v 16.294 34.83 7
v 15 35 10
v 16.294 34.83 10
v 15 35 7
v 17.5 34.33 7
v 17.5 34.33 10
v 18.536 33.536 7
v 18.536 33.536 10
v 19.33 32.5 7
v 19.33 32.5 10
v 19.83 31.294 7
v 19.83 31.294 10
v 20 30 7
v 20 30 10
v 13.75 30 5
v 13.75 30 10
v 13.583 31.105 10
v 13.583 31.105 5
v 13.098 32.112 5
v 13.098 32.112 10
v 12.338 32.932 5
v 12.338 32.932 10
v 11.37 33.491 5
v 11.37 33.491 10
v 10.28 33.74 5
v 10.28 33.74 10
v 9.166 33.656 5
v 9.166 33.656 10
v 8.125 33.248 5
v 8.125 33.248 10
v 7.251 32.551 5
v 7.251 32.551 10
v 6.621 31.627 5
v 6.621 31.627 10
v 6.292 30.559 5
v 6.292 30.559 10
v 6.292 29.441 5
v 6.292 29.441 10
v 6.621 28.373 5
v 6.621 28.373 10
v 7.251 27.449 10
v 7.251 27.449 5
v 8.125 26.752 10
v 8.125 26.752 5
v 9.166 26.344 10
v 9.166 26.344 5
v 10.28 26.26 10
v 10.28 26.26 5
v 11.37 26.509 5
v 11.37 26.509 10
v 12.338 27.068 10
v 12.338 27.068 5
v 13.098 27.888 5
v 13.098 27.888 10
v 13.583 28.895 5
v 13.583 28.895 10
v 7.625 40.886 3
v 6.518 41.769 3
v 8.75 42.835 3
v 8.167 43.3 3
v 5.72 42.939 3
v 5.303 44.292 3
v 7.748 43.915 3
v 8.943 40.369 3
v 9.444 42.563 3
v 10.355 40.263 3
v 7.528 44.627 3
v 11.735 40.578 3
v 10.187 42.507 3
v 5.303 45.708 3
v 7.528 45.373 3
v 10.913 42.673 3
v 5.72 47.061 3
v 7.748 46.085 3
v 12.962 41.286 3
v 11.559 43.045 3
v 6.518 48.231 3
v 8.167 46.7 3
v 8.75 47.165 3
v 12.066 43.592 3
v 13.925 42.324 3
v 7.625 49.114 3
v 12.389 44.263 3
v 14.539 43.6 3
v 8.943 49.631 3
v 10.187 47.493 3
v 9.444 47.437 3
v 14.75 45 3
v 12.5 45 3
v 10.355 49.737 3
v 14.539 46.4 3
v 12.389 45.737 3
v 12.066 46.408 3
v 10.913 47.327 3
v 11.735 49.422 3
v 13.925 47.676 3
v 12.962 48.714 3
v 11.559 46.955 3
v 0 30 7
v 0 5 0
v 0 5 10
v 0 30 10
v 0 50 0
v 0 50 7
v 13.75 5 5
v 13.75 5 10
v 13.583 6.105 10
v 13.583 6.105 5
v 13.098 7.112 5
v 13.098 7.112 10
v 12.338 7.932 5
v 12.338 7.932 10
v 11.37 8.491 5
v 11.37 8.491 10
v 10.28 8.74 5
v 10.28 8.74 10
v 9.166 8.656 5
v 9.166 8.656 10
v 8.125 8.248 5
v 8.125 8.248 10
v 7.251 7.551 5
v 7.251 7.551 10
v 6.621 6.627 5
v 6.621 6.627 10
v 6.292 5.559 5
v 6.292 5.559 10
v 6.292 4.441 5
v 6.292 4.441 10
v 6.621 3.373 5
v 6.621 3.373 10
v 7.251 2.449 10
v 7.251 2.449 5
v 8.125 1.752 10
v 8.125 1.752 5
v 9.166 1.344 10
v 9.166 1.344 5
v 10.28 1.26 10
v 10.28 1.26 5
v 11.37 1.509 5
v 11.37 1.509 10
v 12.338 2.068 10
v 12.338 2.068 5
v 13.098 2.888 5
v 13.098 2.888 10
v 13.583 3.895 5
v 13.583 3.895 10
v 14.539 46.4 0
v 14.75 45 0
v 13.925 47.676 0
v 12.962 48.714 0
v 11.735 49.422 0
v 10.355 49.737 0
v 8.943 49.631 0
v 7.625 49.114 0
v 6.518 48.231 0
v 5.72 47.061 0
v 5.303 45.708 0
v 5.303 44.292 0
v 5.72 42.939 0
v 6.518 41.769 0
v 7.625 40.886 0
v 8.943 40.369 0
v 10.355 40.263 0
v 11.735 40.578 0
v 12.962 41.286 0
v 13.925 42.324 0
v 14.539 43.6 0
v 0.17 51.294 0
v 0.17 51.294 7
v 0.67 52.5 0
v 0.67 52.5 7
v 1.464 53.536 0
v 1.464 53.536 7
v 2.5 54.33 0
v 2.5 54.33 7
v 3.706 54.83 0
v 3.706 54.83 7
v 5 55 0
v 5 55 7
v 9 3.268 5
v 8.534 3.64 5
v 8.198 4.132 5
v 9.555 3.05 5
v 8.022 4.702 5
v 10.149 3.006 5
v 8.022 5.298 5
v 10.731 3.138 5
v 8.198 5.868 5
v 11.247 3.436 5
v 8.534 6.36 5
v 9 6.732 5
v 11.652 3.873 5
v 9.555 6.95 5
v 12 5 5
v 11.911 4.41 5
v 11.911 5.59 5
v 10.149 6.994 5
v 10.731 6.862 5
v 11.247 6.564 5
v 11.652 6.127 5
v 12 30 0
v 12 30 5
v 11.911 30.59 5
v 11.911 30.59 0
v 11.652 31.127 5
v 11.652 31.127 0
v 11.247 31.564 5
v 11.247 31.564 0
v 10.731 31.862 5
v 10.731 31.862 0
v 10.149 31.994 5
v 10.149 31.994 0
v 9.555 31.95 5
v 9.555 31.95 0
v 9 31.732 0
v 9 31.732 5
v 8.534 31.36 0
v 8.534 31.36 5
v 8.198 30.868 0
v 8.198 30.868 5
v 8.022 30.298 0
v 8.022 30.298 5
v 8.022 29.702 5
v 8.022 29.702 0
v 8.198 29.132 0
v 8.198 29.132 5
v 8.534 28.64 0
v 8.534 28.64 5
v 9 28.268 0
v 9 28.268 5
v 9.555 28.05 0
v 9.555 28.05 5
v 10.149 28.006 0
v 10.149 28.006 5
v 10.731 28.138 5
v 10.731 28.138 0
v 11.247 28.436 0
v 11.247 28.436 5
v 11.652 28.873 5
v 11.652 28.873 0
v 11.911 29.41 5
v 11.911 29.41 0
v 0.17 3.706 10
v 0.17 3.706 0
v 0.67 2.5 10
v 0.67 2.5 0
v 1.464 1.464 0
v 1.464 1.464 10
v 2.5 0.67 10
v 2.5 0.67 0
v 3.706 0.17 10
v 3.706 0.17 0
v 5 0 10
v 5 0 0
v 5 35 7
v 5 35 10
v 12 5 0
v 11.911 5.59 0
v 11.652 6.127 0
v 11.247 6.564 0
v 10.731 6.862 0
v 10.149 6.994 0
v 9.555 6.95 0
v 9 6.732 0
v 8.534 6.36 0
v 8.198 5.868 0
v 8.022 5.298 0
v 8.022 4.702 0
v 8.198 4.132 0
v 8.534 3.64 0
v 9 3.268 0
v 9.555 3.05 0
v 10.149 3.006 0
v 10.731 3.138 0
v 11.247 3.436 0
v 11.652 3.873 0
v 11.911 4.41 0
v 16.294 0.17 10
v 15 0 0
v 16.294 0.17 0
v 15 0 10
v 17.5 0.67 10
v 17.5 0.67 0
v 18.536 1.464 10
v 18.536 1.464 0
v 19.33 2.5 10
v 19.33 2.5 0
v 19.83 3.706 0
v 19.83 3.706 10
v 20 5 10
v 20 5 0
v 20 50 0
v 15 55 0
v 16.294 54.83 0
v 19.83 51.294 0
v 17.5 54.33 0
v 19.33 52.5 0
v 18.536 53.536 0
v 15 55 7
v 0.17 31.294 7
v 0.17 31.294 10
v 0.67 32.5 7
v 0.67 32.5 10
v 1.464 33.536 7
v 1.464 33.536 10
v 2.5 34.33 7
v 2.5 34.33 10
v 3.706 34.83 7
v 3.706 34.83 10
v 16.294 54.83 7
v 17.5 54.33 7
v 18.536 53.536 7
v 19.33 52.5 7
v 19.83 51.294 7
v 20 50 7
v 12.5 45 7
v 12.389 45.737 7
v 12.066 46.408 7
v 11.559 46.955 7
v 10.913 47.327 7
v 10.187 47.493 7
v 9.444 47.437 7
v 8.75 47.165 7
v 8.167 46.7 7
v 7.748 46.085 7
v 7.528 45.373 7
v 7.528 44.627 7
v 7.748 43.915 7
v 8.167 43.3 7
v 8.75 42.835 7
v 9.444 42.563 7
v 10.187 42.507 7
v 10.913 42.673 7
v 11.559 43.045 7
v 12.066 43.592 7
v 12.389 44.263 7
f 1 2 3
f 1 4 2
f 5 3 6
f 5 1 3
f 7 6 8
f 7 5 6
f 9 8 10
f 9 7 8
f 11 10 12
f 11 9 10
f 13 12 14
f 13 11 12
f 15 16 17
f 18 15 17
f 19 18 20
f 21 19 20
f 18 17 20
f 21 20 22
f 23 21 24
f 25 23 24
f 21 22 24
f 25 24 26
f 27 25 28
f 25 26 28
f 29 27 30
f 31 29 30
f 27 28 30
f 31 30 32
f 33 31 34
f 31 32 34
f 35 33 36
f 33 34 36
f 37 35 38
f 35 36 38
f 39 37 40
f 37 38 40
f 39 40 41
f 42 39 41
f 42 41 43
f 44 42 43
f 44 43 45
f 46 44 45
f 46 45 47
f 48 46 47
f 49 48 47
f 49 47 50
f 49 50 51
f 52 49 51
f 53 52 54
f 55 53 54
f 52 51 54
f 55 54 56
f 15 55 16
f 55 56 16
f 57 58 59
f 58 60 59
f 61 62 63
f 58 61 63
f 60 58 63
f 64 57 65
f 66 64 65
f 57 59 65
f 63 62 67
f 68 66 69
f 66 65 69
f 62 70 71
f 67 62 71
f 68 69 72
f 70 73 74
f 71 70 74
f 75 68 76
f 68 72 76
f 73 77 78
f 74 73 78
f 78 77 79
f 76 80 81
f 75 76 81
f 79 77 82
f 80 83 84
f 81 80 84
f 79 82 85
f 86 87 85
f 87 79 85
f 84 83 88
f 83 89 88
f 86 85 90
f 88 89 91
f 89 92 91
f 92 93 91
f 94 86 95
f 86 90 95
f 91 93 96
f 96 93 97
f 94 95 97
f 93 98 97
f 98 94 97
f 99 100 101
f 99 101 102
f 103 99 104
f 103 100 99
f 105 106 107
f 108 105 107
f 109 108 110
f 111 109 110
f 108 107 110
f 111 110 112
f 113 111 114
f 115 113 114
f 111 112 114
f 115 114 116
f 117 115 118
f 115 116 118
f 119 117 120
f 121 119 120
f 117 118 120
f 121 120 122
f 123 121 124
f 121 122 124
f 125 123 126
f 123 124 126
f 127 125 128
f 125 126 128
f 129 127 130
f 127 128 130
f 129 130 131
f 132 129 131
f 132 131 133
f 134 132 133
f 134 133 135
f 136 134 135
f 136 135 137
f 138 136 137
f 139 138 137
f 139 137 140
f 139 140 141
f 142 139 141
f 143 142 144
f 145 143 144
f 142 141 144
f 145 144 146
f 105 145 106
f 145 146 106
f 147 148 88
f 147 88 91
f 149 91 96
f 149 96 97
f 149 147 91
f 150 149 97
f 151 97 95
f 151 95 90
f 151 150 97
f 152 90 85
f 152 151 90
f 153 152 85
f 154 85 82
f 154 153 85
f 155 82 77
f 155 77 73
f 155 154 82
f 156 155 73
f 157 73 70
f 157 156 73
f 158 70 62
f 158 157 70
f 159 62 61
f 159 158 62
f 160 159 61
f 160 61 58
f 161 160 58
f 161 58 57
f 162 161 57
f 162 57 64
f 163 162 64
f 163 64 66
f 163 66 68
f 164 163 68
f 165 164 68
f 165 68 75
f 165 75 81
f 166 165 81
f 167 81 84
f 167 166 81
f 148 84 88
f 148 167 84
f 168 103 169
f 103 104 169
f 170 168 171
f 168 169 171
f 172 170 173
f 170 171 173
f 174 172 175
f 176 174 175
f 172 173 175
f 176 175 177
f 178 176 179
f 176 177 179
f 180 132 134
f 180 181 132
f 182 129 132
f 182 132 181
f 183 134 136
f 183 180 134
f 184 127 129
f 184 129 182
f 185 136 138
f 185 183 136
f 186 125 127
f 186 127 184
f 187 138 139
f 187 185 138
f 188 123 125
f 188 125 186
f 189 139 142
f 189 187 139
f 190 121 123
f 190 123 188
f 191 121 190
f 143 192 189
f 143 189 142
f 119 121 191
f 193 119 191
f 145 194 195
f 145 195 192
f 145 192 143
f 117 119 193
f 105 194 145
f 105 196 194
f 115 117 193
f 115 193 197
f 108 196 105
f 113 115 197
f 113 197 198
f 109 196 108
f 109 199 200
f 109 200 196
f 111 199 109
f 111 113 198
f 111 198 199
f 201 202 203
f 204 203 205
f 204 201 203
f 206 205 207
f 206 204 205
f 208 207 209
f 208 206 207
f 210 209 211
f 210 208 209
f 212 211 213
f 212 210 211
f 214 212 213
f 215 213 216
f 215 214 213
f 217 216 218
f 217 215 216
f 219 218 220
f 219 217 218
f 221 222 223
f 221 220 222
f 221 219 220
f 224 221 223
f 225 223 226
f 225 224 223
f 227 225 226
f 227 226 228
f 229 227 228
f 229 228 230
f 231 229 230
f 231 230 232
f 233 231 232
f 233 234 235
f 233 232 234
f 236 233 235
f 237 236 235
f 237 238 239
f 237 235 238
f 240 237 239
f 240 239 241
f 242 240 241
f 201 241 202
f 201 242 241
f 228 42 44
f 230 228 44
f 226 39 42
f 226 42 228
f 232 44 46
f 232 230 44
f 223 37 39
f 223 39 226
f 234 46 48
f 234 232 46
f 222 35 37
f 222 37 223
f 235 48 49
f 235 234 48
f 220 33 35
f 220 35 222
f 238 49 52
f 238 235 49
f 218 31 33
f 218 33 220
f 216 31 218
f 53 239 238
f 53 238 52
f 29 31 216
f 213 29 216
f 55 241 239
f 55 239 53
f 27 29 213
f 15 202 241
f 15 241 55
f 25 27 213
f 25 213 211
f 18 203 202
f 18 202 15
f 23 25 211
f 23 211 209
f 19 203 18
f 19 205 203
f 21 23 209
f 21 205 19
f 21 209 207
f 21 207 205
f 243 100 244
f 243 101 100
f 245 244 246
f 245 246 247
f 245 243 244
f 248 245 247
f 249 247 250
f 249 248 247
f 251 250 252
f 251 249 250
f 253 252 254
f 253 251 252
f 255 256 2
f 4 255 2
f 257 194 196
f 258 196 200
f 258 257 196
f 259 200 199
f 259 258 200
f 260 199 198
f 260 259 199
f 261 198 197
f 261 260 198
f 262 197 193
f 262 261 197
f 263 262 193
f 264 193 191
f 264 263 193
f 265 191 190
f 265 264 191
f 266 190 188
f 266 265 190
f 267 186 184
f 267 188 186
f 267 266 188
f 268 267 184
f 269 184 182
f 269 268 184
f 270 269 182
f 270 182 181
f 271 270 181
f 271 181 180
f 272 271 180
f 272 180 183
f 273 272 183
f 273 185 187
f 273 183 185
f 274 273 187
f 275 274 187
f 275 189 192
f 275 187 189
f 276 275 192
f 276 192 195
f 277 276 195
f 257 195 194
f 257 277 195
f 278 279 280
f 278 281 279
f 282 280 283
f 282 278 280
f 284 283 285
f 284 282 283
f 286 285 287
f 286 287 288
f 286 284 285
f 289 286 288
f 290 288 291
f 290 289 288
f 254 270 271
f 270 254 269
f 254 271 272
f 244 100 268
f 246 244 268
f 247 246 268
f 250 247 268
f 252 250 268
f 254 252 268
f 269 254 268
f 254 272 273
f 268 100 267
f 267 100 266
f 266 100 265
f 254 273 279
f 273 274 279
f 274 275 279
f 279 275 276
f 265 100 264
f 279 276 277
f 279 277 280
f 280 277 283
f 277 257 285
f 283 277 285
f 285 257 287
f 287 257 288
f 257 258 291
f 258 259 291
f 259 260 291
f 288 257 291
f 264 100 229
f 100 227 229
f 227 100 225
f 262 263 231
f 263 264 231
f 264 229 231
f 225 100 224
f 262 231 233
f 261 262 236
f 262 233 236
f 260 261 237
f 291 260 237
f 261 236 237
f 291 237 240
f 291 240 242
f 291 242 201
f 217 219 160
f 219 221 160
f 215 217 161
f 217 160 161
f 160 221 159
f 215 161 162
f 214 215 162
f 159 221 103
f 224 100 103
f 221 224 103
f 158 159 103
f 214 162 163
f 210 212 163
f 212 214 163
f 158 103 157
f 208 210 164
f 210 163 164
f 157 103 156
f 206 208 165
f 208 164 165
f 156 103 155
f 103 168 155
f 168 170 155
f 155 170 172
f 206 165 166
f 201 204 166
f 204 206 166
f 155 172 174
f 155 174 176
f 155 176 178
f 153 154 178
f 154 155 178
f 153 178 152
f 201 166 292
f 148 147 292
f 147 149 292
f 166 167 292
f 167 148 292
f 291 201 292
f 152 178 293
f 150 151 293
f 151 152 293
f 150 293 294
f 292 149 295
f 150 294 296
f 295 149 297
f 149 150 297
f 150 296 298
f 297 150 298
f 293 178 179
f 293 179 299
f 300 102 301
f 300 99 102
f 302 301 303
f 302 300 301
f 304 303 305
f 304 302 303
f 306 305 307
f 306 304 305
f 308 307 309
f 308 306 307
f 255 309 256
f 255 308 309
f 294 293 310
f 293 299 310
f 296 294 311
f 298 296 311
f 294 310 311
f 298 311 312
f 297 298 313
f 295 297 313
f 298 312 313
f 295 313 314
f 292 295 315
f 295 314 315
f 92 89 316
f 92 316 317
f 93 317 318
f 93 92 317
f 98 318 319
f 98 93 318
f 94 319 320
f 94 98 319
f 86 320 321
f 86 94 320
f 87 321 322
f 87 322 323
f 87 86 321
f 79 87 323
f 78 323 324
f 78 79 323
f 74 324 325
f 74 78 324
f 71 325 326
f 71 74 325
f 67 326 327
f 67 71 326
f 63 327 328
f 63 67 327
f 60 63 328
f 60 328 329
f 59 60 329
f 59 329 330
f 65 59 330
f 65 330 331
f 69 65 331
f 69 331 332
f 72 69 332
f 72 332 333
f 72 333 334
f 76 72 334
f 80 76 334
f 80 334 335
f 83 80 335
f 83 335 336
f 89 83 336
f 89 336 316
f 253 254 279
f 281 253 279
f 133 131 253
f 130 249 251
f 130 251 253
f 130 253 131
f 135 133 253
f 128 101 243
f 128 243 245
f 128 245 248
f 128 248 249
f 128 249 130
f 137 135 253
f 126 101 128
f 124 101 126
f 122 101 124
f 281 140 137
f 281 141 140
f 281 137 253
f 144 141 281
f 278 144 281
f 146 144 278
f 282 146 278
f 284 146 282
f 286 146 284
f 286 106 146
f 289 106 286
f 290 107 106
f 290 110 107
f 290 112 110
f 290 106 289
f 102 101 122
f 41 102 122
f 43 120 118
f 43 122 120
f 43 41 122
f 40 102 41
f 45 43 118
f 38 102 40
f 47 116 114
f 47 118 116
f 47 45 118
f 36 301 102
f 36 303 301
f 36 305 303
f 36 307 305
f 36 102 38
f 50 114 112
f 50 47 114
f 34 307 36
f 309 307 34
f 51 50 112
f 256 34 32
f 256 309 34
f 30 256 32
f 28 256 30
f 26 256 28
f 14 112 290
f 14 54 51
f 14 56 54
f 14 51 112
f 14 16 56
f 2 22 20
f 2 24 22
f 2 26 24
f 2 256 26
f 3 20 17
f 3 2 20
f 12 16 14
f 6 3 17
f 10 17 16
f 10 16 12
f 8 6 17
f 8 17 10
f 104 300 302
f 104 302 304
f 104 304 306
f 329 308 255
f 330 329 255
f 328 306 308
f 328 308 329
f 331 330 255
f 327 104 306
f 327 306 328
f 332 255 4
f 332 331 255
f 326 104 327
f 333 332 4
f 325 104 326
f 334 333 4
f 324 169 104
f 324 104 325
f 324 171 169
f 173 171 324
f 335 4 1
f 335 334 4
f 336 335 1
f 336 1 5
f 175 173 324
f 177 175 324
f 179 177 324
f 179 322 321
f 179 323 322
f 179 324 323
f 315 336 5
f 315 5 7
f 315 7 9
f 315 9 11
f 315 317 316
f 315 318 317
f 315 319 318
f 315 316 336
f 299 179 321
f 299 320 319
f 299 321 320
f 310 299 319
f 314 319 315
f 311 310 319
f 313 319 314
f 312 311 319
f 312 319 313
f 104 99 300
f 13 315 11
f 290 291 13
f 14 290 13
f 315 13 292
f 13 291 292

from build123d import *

# Parameters (mm, degrees)
F0_W     = 20
F0_H     = 55
F0_R     = 2
F0_R_2   = 2.5
F1_DEPTH = 10
F2_R     = 3.75
F3_DEPTH = 5
F4_W     = 20
F4_H     = 20
F4_R     = 2.5
F5_DEPTH = 3
F6_R     = 5
F7_R     = 4.75
F7_R_2   = 2.5
F8_DEPTH = 3


with BuildPart() as f1:
    # F0 (on Top) → F1 (new body)
    with BuildSketch(Plane.XY):
        with Locations((10, 27.5)):
            Rectangle(F0_W, F0_H)
        with Locations((10, 5)):
            Circle(F0_R, mode=Mode.SUBTRACT)
        with Locations((10, 30)):
            Circle(F0_R, mode=Mode.SUBTRACT)
        with Locations((10, 45)):
            Circle(F0_R_2, mode=Mode.SUBTRACT)
    extrude(amount=F1_DEPTH)

    # F2 (on face) → F3 (cut)
    with BuildSketch(Plane.XY.offset(10)):
        with Locations((10, 5)):
            Circle(F2_R)
        with Locations((10, 30)):
            Circle(F2_R)
    extrude(amount=-F3_DEPTH, mode=Mode.SUBTRACT)

    # F4 (on face) → F5 (cut)
    with BuildSketch(Plane.XY.offset(10)):
        with Locations((10, 45)):
            Rectangle(F4_W, F4_H)
        with Locations((10, 45)):
            Circle(F4_R, mode=Mode.SUBTRACT)
    extrude(amount=-F5_DEPTH, mode=Mode.SUBTRACT)

    # F6
    f6_edges = [f1.edges().sort_by_distance(p)[0] for p in [
        (20, 0, 5),
        (20, 55, 3.5),
        (0, 55, 3.5),
        (0, 0, 5),
        (20, 35, 8.5),
        (0, 35, 8.5),
    ]]
    fillet(f6_edges, radius=F6_R)

    # F7 (on face) → F8 (cut)
    with BuildSketch(Plane.XY):
        with Locations((10, 45)):
            Circle(F7_R)
        with Locations((10, 45)):
            Circle(F7_R_2, mode=Mode.SUBTRACT)
    extrude(amount=F8_DEPTH, mode=Mode.SUBTRACT)


solid = f1.part
